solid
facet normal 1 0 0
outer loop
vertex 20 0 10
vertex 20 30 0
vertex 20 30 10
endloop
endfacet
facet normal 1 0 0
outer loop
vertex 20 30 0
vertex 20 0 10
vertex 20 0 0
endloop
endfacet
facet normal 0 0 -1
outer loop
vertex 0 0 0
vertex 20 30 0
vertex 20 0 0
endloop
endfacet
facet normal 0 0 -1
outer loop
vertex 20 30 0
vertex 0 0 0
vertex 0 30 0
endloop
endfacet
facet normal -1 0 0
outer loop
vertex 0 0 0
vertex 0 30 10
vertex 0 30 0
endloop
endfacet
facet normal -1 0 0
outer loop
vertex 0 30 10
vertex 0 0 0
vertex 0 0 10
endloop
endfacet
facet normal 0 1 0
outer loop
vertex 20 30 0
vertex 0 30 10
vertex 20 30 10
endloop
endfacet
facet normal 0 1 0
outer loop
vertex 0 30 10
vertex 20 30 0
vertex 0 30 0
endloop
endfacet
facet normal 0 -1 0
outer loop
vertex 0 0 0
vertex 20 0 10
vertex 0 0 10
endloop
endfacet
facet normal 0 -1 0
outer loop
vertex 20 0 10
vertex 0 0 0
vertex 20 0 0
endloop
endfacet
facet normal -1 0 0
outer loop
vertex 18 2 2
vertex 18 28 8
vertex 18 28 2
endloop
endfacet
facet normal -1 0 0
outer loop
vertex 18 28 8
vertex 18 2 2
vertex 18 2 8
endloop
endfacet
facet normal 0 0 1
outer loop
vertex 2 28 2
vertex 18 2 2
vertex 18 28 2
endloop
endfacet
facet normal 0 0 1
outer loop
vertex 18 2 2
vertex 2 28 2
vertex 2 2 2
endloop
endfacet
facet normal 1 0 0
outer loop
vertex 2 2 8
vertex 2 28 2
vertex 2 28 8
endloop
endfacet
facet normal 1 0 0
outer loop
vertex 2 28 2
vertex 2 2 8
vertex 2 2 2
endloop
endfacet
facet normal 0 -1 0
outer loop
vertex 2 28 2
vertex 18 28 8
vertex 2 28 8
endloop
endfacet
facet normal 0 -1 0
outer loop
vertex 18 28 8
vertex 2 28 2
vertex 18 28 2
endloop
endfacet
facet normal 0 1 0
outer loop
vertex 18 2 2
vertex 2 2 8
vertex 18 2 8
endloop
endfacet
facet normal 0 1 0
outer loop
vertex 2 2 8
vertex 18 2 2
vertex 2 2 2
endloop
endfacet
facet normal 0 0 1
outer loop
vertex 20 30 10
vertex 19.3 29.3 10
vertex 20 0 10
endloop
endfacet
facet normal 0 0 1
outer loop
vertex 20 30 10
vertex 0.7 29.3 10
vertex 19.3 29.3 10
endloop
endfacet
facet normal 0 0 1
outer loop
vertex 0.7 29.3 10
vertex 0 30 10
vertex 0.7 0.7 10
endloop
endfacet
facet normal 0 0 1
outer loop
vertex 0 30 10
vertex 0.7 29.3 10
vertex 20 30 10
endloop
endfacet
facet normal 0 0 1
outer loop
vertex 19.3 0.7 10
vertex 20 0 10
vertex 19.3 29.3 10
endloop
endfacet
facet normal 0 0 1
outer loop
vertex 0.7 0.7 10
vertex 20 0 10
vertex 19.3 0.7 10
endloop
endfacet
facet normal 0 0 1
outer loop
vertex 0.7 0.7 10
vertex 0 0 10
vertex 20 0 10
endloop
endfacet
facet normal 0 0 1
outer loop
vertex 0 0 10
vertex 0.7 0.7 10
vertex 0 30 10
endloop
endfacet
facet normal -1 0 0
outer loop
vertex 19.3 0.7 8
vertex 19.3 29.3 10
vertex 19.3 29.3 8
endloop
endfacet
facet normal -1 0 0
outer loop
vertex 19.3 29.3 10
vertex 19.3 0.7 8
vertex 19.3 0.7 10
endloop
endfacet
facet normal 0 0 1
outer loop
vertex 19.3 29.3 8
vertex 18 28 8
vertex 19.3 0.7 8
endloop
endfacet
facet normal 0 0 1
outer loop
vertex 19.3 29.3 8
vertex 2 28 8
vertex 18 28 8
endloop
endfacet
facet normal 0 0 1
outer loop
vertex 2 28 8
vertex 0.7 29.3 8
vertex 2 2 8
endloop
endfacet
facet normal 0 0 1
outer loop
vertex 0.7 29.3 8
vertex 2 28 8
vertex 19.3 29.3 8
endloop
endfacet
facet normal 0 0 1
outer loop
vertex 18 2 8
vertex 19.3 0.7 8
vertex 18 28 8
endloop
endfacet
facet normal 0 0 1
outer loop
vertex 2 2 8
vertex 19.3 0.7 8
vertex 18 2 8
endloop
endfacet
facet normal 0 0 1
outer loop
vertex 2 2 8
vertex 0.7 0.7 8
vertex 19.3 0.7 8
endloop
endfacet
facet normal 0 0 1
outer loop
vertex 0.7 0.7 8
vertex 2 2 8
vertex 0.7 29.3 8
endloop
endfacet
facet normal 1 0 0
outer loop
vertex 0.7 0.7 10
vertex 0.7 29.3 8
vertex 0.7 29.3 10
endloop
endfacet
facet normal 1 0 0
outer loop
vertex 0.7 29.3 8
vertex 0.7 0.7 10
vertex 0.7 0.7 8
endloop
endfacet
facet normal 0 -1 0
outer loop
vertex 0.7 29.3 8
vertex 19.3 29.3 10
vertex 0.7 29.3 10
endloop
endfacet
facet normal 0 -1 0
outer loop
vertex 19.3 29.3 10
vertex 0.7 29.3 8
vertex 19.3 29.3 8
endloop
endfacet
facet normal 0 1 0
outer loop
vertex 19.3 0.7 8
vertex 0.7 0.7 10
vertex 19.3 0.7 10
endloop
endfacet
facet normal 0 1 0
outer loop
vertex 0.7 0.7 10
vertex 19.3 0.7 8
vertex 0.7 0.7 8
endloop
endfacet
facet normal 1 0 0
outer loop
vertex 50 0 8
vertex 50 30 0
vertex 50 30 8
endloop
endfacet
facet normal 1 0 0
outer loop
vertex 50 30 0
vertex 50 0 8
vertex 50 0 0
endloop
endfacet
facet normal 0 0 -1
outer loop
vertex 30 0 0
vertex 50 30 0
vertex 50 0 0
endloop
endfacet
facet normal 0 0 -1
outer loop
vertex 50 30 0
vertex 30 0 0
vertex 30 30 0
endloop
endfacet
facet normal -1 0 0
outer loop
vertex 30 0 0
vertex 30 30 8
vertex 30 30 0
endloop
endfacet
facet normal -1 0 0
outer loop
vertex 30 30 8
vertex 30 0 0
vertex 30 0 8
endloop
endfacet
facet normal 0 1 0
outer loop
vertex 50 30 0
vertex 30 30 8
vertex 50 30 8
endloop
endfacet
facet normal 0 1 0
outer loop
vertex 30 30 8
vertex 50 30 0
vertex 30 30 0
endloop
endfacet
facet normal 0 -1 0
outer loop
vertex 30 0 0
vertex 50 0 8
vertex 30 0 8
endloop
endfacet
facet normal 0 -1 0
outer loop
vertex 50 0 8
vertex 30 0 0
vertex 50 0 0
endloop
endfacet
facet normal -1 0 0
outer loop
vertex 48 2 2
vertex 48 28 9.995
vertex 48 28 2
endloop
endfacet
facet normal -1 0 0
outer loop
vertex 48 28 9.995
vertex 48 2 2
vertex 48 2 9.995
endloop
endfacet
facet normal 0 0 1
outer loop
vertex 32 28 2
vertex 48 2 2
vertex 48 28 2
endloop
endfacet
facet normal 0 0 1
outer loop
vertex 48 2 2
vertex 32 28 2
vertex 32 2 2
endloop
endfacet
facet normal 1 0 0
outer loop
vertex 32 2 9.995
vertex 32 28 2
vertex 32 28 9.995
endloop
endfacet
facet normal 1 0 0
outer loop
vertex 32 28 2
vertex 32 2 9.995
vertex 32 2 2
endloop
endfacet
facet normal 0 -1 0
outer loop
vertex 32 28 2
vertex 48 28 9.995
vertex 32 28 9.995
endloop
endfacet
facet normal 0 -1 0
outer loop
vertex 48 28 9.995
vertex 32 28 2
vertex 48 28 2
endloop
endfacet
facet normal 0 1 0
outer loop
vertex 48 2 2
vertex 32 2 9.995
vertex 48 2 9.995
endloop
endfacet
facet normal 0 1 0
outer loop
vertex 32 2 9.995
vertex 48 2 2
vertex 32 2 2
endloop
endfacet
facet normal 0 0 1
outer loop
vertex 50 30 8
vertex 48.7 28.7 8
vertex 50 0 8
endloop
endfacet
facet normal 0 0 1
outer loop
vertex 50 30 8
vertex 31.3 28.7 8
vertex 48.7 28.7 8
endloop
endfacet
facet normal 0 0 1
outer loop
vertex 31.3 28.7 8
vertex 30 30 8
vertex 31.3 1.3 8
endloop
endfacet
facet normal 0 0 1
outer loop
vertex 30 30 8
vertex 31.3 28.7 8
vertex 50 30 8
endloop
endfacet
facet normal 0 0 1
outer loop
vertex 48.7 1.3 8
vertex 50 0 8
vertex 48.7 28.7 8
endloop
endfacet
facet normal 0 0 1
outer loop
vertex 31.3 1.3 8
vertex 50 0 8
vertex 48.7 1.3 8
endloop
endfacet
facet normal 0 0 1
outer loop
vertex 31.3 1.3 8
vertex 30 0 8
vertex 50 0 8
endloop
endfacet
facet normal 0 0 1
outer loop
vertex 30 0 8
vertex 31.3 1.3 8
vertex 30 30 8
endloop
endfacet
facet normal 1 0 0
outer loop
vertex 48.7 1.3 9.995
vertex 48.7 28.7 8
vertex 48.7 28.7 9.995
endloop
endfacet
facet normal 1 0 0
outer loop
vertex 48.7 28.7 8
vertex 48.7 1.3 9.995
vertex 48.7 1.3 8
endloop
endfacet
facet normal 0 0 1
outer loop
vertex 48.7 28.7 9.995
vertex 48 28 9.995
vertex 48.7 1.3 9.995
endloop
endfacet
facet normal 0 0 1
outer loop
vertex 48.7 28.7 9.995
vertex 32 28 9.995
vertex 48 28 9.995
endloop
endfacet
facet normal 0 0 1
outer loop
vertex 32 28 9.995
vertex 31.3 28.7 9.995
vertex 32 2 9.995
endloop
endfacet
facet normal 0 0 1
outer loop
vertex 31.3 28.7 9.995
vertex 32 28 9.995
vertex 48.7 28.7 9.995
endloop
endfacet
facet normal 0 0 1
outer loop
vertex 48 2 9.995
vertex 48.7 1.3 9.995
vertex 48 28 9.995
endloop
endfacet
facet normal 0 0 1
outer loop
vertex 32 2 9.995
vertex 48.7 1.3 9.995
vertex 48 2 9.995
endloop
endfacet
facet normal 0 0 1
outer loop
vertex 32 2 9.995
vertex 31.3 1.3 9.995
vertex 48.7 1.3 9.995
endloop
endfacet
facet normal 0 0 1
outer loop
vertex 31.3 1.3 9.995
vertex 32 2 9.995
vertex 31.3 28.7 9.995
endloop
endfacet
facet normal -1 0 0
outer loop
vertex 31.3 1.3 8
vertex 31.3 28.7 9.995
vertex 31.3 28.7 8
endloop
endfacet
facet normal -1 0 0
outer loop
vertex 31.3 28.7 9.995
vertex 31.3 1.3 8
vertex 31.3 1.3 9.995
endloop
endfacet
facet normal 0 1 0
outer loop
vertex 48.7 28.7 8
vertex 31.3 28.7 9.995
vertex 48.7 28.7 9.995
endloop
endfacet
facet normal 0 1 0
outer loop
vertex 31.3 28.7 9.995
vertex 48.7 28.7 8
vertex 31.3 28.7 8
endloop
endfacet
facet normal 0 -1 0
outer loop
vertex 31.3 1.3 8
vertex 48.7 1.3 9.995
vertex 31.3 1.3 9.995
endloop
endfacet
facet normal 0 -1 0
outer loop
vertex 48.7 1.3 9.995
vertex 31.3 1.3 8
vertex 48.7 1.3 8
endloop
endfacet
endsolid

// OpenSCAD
// file: ../math/split.scad
module top_part(full_size, height, dx = 0.01){
    size_to_differ = [full_size.x + dx * 2, full_size.y + dx*2, full_size.z - height + dx];
    difference() {
        children();
        translate([-dx, -dx, -dx]) 
        cube(size_to_differ);
    }
}

module bottom_part(full_size, height, dx = 0.01){
    size_to_differ = [full_size.x + dx * 2, full_size.y + dx*2, full_size.z - height + dx];
    difference() {
        children();
        translate([-dx, -dx, height]) 
        cube(size_to_differ);
    }
}

top_part(full_size = [100, 100, 100], height = 10)
    cube([100, 100, 100]);

bottom_part(full_size = [100, 100, 100], height = 10)
    cube([100, 100, 100]);
// file: ../math/vect.scad
function vect_scalar_sum(v, incr) = [for (i = [0: len(v) - 1]) v[i] + incr];

function vSize(size) = (!is_list(size)) ? [size, size, size]: size; 


function vect_2d_to_3d(vect, z = 0) = [vect[0], vect[1], z];

function vect_rotate2d(vect, b) = [
    cos(b) * vect[0] - sin(b) * vect[1],
    sin(b) * vect[0] + cos(b) * vect[1]
];

function round_vect(v) = [for (i = [0: len(v) - 1]) round(v[i])];

function vect_swap_xy(v1) = [v1.y, v1.x, v1.z];

function vectorize_2(x) = is_list(x) ? [x.x, x.y] : [x, x];

function vectorize_3(x) = is_list(x) ? [x.x, x.y, x.z] : [x, x, x];

echo (vectorize_3(1));
// file: ../math/align.scad
use <vect.scad>
module align_center(sizes, center = true, centerZ = false, vector=[1, 1, 0]){
    xxx=vector.x;
    yyy=vector.y;
    zzz=centerZ || vector.z;
    sizes = vSize(sizes);
    if (center){
        translate([xxx ? -sizes[0] / 2 : 0, yyy ? -sizes[1] / 2: 0, zzz ? -sizes[2]/2 : 0]){
            children();
        }
    } else {
        children();
    }   
}

module align_uncenter(sizes, uncenter = true, uncenterZ = false){
    sizes = vSize(sizes);
    if (uncenter){
        translate([sizes[0] / 2, sizes[1] / 2, (uncenterZ ? sizes[2]/2 : 0)]){
            children();
        }
    } else {
        children();
    }   
}

ALIGN_LEFT=[1, 0, 0];
ALIGN_RIGHT=[-1, 0, 0];
ALIGN_BOTTOM=[0, 0, -1];
ALIGN_TOP=[0, 0, 1];
ALIGN_BACK=[0, -1, 0];
ALIGN_FWD=[0, 1, 0];

function _aligner(target, source, align) = 
            align > 0 ? target * align:
            align < 0 ? source * align:
            (target - source) / 2;    

function aligner(target_sizes, source_sizes, vector) = [
    vector.x == undef ? 0 : _aligner(target_sizes.y, source_sizes.x, vector.x),
    vector.y == undef ? 0 : _aligner(target_sizes.y, source_sizes.y, vector.y),
    vector.z == undef ? 0 : _aligner(target_sizes.z, source_sizes.z, vector.z)
];

module align_relative(
    target_sizes, 
    source_sizes, 
    vector=[0,0,undef]
    ){
        
    // x = vector.x == undef ? 0 : _aligner(target_sizes.y, source_sizes.x, vector.x);
    // y = vector.y == undef ? 0 : _aligner(target_sizes.y, source_sizes.y, vector.y);
    // z = vector.z == undef ? 0 : _aligner(target_sizes.z, source_sizes.z, vector.z);
    translate(aligner(target_sizes, source_sizes, vector))
        children();
}

module align_center_source_vs_target(target_sizes, source_sizes, centerZ = false){
    align_relative(target_sizes=target_sizes, source_sizes=source_sizes, vector=[0, 0, centerZ ? 1 : 0]);
    // align_uncenter(target_sizes, uncenterZ = centerZ)
    // union(){
    //     align_center(target_sizes, center = true, centerZ = centerZ)
    //         children(0);
    //     align_center(source_sizes, center = true, centerZ = centerZ)
    //         children(1);
    // }
}


module zz(z){
    translate([0, 0, z])
        children();
}

module xx(x){
    translate([x, 0, 0])
        children();
}

module yy(y){
    translate([0, y, 0])
        children();
}

module zc(){
    translate([0, 0, -0.01])
        children();
}
module xc(){
    translate([-0.01, 0, 0])    
        children();
}
module yc(){
    translate([0, -0.01, 0])
        children();
}

// align_center_source_vs_target([100, 100, 1], [10, 10, 10], centerZ = false){
//     cube([100,100,1]);
//     cube([10,10,10]);
// }

// align_center(20){
//     align_uncenter(20){
//         cube(20);
//     }
// }

// target_sizes = [20, 20, 20];
// source_sizes = [10, 10, 10];
// color("azure",0.25)
//     cube(size=target_sizes);
// align_relative(target_sizes=target_sizes, source_sizes=source_sizes, vector=[0, 0, undef]){
//     color("red",0.25)
//         zz(20)
//         cube(size=source_sizes);
// }
// main file
use <../math/align.scad>
use <../math/vect.scad>
use <../math/split.scad>

module simple_chassis(
    size,
    lower_part_h,
    wallW,
    indent,
    indent_h,
    indent_size_correction,
    upperPart = true,
    rotated = true
){
    inner_indent_w = wallW - indent - indent_size_correction;
    outer_indent_w = indent + indent_size_correction;
    inner_size = vect_scalar_sum(size, -wallW * 2);

    module _main(){
        difference() {
            cube(size);
            translate([wallW, wallW, wallW]) 
                cube(inner_size);
        }
    }

    module _inner_indent(){
        indent_size = [size.x - inner_indent_w * 2, size.y - inner_indent_w * 2, indent_h + 0.01];
        xx(inner_indent_w) yy(inner_indent_w)
            cube(indent_size);
    }

    module _outer_indent(){
        xcc=0.01;
        indent_size = [size.x - outer_indent_w * 2, size.y - outer_indent_w * 2, indent_h];
        outer_indent_size = [size.x + xcc , size.y + xcc , indent_h + xcc ];
        difference() {
            xx(-xcc / 2) yy(-xcc / 2)
            cube(outer_indent_size);
            xx(outer_indent_w) yy(outer_indent_w) zz(-0.01 / 2) 
                cube(indent_size);
        }
        
    }

    
    module _t(){
        difference() {
            zz(size.z)
            mirror([0, 0, 1]) 
            top_part(size, size.z - lower_part_h)
                _main();
            zz(size.z - lower_part_h - indent_h)
            _inner_indent();
        }
        
    }
    module _b(){
        difference() {
            bottom_part(size, lower_part_h)
                            _main();
            zz(lower_part_h - indent_h)
                _outer_indent();
        }
            
    }

    
    if (upperPart){
        _t();
    } else {
        _b();
    }
}

simple_chassis(size = [20, 30, 20], lower_part_h = 10, wallW = 2, indent = 1, indent_h = 2, indent_size_correction = 0.3, upperPart = true);
xx(30)
simple_chassis(size = [20, 30, 20], lower_part_h = 10, wallW = 2, indent = 1, indent_h = 2, indent_size_correction = 0.3, upperPart = false);
